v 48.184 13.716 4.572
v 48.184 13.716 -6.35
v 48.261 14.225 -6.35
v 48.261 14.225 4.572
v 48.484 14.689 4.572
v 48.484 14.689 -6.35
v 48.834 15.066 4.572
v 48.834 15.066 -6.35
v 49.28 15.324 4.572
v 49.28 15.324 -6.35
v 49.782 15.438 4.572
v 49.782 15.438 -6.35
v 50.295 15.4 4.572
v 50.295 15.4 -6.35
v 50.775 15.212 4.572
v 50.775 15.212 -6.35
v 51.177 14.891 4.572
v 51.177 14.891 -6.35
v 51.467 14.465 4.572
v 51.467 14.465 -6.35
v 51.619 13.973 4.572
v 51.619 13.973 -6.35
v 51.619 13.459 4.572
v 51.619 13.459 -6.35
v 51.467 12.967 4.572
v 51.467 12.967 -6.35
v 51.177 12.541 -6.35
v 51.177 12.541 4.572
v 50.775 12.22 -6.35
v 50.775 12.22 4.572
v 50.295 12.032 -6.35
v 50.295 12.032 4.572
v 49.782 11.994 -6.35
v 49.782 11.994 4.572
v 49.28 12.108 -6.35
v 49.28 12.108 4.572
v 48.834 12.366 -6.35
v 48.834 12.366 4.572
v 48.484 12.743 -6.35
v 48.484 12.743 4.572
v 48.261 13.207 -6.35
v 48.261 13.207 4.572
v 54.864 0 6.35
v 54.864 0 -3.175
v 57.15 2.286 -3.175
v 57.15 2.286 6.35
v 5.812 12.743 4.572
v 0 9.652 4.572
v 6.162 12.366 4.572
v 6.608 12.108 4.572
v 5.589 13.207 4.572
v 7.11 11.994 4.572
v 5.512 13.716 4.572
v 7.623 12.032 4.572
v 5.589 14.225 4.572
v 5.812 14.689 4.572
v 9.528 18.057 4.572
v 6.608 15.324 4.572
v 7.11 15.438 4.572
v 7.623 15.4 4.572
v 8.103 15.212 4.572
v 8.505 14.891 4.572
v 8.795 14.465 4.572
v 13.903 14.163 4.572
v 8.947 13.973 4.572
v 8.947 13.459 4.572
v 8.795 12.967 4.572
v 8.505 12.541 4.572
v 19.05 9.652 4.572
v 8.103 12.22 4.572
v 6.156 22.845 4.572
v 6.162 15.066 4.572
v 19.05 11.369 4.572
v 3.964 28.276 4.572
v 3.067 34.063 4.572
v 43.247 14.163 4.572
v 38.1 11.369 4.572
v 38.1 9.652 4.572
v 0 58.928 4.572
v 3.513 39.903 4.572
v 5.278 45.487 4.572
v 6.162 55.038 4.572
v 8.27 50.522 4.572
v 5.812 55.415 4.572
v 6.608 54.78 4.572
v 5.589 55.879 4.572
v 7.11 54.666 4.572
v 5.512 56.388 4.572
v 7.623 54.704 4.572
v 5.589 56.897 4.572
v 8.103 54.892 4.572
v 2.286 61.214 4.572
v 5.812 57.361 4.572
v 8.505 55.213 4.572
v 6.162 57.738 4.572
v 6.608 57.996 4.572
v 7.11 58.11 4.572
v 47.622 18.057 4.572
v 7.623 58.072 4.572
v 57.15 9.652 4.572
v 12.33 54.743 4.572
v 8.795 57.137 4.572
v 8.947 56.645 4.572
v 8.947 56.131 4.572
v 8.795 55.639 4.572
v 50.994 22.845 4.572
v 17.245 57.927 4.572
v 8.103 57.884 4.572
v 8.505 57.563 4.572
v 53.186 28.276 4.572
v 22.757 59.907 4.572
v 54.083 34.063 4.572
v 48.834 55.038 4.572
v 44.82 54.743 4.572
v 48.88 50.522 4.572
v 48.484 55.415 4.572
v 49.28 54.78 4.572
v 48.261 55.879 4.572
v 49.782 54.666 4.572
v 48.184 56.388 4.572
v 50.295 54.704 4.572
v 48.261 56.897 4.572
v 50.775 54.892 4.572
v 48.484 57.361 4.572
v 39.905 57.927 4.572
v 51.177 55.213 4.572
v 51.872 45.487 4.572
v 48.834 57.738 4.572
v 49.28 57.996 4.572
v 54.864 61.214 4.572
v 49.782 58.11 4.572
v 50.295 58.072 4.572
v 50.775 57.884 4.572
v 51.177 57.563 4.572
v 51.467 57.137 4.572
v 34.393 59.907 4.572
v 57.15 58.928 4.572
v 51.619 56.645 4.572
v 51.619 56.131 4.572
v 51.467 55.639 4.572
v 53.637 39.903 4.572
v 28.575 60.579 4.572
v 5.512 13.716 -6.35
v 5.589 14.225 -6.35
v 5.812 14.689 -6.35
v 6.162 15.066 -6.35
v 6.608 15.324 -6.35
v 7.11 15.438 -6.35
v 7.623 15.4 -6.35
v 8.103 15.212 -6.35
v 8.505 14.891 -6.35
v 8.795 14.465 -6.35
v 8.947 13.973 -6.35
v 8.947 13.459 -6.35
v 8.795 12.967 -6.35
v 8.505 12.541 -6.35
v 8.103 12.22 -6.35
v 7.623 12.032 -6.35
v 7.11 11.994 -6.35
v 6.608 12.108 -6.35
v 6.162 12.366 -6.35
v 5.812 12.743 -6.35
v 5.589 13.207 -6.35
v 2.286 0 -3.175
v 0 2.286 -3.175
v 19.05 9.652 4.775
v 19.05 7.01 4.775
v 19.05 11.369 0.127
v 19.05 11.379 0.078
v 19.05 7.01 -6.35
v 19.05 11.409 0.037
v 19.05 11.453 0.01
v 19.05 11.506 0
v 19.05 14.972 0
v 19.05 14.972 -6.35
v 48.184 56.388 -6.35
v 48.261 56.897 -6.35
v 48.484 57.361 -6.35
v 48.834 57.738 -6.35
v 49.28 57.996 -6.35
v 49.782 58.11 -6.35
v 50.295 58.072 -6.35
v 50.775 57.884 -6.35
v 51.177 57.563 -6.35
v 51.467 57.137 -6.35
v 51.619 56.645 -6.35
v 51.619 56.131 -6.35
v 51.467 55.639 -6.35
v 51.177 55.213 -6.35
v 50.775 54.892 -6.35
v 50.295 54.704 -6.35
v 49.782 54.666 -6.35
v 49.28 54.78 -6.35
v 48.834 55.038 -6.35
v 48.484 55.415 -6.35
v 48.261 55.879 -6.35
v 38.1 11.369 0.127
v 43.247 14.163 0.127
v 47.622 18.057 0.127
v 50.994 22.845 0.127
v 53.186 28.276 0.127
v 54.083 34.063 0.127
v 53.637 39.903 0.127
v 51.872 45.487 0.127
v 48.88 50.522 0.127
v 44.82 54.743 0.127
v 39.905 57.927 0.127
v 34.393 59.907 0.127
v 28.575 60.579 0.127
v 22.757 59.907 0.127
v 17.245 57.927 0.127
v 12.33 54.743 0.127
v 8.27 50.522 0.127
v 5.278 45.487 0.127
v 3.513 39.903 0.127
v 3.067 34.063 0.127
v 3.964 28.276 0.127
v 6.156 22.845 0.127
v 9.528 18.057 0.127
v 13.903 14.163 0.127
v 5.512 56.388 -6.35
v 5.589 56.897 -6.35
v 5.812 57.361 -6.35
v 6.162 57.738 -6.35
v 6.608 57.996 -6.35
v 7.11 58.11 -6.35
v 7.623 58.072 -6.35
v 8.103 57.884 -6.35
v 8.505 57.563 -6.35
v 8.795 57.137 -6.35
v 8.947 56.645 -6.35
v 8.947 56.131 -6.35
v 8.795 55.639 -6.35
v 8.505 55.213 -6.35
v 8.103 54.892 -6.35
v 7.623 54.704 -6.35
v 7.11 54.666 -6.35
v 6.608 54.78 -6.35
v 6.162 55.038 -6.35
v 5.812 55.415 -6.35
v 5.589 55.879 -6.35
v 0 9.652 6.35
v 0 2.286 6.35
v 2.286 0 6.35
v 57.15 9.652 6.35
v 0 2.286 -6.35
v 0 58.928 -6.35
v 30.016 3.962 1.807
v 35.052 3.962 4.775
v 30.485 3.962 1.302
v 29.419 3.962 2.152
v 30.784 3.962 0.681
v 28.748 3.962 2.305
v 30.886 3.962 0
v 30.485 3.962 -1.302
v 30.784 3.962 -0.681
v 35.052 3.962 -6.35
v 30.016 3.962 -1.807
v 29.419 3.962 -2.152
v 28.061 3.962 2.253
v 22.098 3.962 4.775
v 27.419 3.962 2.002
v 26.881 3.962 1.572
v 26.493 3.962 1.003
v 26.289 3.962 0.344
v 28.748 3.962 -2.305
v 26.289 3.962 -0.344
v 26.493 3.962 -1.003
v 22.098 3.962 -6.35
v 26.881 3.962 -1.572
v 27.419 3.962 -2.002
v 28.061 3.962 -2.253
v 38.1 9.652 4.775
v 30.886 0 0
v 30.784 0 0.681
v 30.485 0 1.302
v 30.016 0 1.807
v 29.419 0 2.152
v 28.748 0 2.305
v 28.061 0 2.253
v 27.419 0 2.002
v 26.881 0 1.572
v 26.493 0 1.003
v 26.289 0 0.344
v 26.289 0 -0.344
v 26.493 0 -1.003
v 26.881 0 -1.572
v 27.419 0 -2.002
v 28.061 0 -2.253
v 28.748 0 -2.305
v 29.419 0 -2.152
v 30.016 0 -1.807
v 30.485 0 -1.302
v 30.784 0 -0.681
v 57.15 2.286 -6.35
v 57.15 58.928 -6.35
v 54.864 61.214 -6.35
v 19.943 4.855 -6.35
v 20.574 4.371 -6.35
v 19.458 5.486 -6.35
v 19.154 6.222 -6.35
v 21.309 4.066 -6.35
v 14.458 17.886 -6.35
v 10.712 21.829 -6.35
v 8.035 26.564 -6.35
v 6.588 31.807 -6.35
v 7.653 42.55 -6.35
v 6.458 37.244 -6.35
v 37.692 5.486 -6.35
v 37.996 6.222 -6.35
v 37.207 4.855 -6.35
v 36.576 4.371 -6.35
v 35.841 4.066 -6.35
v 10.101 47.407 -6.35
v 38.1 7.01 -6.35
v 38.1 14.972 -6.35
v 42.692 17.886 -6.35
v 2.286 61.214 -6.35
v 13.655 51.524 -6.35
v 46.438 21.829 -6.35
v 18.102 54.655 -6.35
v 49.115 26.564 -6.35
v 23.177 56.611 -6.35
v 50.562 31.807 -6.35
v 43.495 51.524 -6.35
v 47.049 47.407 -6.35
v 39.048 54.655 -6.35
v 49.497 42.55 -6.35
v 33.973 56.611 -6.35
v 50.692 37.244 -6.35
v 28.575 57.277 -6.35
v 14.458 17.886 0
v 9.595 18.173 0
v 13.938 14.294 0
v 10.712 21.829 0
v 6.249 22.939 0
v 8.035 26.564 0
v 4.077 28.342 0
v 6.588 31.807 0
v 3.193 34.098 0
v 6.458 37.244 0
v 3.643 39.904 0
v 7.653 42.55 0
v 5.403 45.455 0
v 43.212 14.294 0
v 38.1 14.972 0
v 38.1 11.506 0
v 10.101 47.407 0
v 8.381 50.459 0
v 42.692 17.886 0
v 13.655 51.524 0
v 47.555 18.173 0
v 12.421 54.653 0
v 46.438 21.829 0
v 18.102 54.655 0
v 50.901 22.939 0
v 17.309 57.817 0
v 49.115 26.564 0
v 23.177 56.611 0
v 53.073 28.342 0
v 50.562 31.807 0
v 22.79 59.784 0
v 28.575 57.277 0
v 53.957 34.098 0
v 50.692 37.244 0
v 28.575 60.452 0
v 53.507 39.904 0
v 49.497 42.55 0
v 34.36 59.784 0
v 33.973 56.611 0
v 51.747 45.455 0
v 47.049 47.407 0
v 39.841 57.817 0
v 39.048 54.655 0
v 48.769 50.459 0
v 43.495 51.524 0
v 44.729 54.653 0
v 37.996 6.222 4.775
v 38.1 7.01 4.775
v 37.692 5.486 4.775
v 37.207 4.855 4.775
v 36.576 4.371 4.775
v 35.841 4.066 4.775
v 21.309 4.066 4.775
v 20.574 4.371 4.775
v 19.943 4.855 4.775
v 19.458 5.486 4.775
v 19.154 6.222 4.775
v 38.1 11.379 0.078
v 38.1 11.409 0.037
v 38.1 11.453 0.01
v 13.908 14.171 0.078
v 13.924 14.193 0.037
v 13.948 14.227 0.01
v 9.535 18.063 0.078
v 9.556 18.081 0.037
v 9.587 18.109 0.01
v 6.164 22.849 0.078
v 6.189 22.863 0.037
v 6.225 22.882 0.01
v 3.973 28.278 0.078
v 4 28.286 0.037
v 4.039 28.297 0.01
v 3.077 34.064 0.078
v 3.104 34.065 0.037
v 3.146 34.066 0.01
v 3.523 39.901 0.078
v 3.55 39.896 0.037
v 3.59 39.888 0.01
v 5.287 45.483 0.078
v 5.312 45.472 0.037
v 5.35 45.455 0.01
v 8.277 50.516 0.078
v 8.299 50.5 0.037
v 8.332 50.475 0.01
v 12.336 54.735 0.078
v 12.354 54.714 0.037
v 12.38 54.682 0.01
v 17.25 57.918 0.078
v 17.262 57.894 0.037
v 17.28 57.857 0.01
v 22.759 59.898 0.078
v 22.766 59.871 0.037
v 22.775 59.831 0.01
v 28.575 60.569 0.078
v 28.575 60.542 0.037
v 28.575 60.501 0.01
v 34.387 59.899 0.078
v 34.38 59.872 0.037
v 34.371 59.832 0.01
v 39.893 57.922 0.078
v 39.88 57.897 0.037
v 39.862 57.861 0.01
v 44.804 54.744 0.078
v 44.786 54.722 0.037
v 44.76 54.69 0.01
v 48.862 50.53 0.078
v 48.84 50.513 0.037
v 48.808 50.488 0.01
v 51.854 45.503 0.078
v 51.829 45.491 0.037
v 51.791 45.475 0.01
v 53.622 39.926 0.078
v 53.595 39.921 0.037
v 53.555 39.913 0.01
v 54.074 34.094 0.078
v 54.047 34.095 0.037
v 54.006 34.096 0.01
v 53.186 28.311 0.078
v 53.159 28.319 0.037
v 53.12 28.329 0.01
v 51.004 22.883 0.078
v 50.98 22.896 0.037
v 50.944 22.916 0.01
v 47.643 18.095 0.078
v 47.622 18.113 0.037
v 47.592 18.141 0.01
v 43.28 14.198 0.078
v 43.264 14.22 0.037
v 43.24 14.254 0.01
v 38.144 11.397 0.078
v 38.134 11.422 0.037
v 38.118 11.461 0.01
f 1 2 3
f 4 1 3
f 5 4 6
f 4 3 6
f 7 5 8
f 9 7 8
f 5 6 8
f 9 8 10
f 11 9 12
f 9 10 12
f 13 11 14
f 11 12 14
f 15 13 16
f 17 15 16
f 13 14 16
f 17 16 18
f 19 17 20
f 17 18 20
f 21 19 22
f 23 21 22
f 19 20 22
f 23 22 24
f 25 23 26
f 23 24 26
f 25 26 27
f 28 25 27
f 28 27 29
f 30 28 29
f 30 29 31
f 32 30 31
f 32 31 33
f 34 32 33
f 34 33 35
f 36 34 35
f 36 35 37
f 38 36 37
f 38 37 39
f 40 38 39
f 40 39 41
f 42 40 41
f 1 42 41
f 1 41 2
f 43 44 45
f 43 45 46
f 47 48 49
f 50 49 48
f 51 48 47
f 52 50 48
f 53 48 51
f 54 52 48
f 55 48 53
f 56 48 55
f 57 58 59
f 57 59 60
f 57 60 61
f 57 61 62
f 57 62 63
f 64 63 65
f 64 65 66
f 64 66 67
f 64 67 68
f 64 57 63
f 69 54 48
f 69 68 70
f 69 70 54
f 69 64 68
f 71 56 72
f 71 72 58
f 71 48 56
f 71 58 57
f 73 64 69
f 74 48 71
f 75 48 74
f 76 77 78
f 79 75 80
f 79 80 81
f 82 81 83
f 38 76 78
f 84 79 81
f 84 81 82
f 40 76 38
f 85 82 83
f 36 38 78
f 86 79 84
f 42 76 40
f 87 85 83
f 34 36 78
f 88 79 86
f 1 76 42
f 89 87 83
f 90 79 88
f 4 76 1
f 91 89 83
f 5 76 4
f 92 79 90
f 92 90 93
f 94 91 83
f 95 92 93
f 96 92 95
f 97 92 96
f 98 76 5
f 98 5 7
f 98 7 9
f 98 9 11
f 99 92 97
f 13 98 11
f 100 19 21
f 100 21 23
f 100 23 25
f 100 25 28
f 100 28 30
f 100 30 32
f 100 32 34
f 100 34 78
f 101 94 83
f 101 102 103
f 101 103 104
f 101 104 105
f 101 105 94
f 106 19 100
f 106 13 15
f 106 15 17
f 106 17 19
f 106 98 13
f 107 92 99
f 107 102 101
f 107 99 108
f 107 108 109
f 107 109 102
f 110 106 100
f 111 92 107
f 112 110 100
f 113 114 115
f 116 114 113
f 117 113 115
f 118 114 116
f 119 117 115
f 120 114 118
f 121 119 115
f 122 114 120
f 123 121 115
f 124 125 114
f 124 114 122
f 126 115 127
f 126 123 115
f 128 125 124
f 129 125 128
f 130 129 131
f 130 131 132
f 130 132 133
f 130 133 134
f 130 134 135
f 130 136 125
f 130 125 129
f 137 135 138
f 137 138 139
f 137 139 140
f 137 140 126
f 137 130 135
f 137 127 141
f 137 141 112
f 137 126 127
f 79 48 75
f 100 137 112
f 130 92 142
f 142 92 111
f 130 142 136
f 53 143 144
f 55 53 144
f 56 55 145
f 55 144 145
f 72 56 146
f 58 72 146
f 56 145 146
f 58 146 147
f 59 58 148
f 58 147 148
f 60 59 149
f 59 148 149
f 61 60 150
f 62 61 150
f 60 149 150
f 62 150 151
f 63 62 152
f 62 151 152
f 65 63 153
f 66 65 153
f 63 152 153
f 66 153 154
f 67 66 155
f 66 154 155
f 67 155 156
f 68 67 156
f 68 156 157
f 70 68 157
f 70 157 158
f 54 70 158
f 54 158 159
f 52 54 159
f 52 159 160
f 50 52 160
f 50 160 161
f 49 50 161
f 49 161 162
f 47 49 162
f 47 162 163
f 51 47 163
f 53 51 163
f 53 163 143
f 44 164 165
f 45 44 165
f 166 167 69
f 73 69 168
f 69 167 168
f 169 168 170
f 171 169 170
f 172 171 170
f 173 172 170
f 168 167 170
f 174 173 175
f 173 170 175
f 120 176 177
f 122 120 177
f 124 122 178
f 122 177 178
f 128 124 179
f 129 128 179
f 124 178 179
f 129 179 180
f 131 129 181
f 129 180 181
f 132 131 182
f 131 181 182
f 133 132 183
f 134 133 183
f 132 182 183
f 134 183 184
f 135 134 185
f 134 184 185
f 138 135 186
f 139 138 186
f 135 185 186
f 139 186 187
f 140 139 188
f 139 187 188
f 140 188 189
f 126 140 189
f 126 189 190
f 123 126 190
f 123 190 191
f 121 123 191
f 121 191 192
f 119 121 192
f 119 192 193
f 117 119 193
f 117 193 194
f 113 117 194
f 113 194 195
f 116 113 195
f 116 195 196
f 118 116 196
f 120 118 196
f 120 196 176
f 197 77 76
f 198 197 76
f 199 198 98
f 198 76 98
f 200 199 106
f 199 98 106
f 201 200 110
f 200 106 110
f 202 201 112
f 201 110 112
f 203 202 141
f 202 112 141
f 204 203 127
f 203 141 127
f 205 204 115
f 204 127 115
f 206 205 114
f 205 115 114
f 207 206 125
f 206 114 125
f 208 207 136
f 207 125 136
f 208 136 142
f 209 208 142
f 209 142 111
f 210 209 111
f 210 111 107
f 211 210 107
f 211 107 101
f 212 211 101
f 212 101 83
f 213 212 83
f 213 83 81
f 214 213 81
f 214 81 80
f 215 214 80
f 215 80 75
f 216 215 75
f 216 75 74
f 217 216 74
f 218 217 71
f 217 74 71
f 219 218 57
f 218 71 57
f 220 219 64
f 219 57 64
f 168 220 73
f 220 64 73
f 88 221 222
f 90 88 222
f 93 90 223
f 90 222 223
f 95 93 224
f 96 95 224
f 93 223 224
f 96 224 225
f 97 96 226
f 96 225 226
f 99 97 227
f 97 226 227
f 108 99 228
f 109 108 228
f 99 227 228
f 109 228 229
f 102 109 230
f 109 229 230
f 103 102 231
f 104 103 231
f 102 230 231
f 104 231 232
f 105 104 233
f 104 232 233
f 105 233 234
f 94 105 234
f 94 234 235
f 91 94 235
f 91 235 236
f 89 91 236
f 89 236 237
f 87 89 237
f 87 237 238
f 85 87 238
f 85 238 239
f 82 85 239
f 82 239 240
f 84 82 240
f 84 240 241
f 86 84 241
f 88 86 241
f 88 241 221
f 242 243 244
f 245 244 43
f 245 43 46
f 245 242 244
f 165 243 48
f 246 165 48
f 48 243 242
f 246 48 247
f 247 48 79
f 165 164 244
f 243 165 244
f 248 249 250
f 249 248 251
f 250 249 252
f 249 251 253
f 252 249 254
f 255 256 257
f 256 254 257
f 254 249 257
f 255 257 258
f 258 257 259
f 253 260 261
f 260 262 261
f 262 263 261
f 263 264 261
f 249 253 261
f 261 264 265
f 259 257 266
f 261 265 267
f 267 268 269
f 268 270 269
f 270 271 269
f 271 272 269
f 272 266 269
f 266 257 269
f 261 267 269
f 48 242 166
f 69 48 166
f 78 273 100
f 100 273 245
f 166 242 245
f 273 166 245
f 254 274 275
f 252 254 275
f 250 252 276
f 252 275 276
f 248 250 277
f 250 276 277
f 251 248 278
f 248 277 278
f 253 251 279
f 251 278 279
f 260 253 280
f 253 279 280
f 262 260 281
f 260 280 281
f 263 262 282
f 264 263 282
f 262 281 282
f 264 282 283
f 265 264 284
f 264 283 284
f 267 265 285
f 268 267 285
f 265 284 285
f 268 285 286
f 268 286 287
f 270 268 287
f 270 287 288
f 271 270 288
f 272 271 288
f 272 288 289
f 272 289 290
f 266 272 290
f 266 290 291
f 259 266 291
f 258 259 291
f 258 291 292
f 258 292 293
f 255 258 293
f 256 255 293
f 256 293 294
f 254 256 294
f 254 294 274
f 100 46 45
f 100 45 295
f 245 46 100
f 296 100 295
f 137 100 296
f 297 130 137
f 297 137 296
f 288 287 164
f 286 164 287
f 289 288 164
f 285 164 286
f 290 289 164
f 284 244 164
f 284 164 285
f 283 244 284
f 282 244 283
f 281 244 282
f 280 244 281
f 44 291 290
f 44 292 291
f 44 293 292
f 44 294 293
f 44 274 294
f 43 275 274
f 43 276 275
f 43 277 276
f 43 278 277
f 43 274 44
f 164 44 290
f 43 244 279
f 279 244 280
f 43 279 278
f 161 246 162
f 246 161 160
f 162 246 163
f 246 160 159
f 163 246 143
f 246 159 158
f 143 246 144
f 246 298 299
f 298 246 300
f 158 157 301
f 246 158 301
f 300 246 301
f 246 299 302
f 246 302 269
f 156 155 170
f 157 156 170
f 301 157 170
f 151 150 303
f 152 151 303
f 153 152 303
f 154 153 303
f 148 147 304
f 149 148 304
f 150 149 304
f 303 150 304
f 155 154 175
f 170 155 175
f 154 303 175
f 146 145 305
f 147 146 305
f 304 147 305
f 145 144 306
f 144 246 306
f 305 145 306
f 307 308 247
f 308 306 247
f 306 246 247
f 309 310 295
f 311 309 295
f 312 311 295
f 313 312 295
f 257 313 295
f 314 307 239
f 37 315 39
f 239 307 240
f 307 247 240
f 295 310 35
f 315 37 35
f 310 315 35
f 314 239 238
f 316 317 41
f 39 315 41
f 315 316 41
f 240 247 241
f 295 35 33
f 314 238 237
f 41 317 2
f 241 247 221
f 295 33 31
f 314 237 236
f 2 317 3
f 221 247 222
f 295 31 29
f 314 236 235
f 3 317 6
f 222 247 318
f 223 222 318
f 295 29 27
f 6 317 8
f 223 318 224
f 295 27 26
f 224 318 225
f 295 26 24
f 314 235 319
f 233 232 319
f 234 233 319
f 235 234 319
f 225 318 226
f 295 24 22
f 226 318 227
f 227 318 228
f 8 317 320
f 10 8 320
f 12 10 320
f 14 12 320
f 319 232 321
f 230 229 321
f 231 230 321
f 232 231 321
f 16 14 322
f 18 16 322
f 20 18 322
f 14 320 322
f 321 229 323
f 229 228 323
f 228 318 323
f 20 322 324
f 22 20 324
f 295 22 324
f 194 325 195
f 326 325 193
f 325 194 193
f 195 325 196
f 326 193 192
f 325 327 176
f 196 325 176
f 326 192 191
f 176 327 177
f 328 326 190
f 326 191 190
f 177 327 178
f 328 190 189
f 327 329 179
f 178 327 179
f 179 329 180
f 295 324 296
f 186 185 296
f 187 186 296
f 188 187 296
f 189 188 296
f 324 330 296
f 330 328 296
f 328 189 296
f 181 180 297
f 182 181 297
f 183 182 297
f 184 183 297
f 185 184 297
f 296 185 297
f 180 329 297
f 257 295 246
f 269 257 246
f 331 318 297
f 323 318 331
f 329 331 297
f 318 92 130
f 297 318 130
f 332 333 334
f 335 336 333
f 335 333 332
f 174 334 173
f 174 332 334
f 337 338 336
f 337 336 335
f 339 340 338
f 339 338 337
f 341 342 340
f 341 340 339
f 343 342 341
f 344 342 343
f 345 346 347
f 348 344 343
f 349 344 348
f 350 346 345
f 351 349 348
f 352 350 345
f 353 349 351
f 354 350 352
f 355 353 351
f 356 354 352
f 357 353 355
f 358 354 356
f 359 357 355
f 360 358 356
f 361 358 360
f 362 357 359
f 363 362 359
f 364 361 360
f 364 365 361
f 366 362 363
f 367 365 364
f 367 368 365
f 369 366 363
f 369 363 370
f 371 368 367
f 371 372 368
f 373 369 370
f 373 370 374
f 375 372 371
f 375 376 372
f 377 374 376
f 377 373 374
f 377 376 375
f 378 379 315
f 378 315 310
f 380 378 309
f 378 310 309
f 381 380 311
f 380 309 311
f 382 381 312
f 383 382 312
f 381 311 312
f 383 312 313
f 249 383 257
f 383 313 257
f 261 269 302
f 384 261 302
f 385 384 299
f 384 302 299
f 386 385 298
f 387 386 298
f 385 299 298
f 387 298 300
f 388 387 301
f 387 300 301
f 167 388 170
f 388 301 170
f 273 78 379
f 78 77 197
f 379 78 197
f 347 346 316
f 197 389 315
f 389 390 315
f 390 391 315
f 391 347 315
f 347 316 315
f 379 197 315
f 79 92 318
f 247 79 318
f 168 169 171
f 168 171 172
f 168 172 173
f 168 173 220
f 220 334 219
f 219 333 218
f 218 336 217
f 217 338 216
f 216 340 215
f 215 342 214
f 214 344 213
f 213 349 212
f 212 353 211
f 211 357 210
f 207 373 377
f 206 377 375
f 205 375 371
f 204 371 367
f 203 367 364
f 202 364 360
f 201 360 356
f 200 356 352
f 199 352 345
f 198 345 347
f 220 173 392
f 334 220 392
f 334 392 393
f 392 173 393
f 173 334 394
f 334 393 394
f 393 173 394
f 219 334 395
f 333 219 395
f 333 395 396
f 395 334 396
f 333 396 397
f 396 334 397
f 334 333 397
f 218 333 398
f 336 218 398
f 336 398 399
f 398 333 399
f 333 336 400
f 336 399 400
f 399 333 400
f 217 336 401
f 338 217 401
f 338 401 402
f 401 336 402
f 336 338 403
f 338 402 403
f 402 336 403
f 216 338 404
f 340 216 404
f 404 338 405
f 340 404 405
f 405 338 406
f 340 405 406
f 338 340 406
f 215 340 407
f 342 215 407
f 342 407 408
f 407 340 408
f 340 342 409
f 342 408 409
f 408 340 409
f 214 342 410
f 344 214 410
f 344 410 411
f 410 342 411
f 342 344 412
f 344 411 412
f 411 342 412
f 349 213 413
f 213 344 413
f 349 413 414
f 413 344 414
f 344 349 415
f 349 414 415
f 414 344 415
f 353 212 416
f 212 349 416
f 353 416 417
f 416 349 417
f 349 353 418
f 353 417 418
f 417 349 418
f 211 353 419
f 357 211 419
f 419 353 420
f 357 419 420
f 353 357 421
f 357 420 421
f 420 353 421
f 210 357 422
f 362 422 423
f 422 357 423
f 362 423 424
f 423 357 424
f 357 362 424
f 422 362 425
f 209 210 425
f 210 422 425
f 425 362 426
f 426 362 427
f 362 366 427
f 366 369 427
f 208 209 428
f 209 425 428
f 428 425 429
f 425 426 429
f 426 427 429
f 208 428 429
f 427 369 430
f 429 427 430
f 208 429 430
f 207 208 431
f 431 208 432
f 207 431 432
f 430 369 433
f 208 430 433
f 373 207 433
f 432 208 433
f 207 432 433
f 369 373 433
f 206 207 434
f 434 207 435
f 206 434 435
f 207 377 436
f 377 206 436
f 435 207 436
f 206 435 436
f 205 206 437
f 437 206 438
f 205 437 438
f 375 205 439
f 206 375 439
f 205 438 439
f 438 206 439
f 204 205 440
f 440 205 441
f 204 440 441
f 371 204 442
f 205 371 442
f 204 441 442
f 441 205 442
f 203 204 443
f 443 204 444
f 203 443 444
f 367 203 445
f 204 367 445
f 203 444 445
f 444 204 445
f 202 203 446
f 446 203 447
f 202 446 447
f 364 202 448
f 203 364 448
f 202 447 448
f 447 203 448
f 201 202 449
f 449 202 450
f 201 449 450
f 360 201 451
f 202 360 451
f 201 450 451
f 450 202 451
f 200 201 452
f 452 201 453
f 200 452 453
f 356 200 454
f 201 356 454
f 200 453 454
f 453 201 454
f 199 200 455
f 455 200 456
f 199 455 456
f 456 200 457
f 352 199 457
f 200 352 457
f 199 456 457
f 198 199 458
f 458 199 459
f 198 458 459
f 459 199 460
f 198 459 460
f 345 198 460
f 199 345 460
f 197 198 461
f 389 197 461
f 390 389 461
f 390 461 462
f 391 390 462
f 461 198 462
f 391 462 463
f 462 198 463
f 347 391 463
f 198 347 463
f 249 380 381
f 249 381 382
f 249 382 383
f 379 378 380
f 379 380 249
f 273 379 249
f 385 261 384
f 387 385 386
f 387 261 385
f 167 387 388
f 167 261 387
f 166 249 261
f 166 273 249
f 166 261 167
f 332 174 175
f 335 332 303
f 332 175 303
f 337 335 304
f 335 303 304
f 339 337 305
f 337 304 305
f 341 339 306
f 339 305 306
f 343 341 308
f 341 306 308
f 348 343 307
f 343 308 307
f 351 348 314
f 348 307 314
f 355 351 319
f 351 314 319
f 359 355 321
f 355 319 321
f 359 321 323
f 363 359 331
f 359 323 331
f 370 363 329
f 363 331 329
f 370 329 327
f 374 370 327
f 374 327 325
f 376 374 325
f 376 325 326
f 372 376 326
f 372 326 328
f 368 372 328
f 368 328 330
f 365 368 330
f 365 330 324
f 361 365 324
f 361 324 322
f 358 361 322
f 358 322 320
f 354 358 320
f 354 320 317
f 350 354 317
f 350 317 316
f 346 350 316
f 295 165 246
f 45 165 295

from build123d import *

# Parameters (mm, degrees)
SKETCH1_W                       = 57.15
SKETCH1_H                       = 61.214
BOSS_EXTRUDE1_DEPTH             = 6.35
SKETCH2_W                       = 57.15
SKETCH2_H                       = 51.562
CUT_EXTRUDE1_DEPTH              = 1.778
F_1_1_DIAMETER_HOLE1_D          = 44.45
CUT_EXTRUDE2_DEPTH              = 11.1252
F_14_0_182_DIAMETER_HOLE1_D     = 4.6228
F_14_0_182_DIAMETER_HOLE1_DEPTH = 13.97
F_14_0_182_DIAMETER_HOLE1_TIP   = 1.388829235
SKETCH10_R                      = 25.527
CUT_EXTRUDE3_DEPTH              = 4.572
CHAMFER1_SIZE                   = 2.286
F_8_32_TAPPED_HOLE1_D           = 3.4544
SKETCH13_W                      = 57.15
SKETCH13_H                      = 3.175
CUT_EXTRUDE4_DEPTH              = 2.286
FILLET1_R                       = 0.127


with BuildPart() as part:
    # Sketch1 → Boss-Extrude1 (new body, symmetric)
    with BuildSketch(Plane.XY):
        with Locations((28.575, 30.607)):
            Rectangle(SKETCH1_W, SKETCH1_H)
    extrude(amount=BOSS_EXTRUDE1_DEPTH, both=True)

    # Sketch2 → Cut-Extrude1 (cut)
    with BuildSketch(Plane.XY.offset(6.35)):
        with Locations((28.575, 35.433)):
            Rectangle(SKETCH2_W, SKETCH2_H)
    extrude(amount=-CUT_EXTRUDE1_DEPTH, mode=Mode.SUBTRACT)

    # 1 (1) Diameter Hole1 (through all)
    with Locations(Plane.XY.offset(4.572)):
        with Locations((28.575, 35.052)):
            Hole(F_1_1_DIAMETER_HOLE1_D / 2)

    # Sketch6 → Cut-Extrude2 (cut)
    with BuildSketch(Plane(origin=(0, 0, -6.35), x_dir=(-1, 0, 0), z_dir=(0, 0, -1))):
        with BuildLine():
            Line((-35.052, 3.9624), (-22.098, 3.9624))
            ThreePointArc((-22.098, 3.9624), (-19.942738531, 4.855138531), (-19.05, 7.0104))
            Line((-19.05, 7.0104), (-19.05, 20.953589203))
            Line((-19.05, 20.953589203), (-38.1, 20.953589203))
            Line((-38.1, 20.953589203), (-38.1, 7.0104))
            ThreePointArc((-38.1, 7.0104), (-37.207261469, 4.855138531), (-35.052, 3.9624))
        make_face()
    extrude(amount=-CUT_EXTRUDE2_DEPTH, mode=Mode.SUBTRACT)

    # #14 (0.182) Diameter Hole1
    with Locations(Plane(origin=(0, 3.9624, 0), x_dir=(-1, 0, 0), z_dir=(0, 1, 0))):
        with Locations((-28.575, 0)):
            Hole(F_14_0_182_DIAMETER_HOLE1_D / 2, depth=F_14_0_182_DIAMETER_HOLE1_DEPTH)
            with Locations((0, 0, -(F_14_0_182_DIAMETER_HOLE1_DEPTH + F_14_0_182_DIAMETER_HOLE1_TIP / 2))):  # 118° drill point
                Cone(0, F_14_0_182_DIAMETER_HOLE1_D / 2, F_14_0_182_DIAMETER_HOLE1_TIP, mode=Mode.SUBTRACT)

    # Sketch10 → Cut-Extrude3 (cut)
    with BuildSketch(Plane.XY.offset(4.572)):
        with Locations((28.575, 35.052)):
            Circle(SKETCH10_R)
    extrude(amount=-CUT_EXTRUDE3_DEPTH, mode=Mode.SUBTRACT)

    # Chamfer1
    chamfer1_edges = [part.edges().sort_by_distance(p)[0] for p in [
        (0, 61.214, -0.889),
        (57.15, 61.214, -0.889),
        (57.15, 0, 0),
        (0, 0, 0),
    ]]
    chamfer(chamfer1_edges, length=CHAMFER1_SIZE)

    # #8-32 Tapped Hole1 (through all)
    with Locations(Plane.XY.offset(4.572)):
        with Locations((7.239, 56.388), (49.911, 56.388), (7.239, 13.716), (49.911, 13.716)):
            Hole(F_8_32_TAPPED_HOLE1_D / 2)

    # Sketch13 → Cut-Extrude4 (cut)
    with BuildSketch(Plane.XZ):
        with Locations((28.575, -4.7625)):
            Rectangle(SKETCH13_W, SKETCH13_H)
    extrude(amount=-CUT_EXTRUDE4_DEPTH, mode=Mode.SUBTRACT)

    # Fillet1
    fillet1_edges = [part.edges().sort_by_distance(p)[0] for p in [
        (28.575, 60.579, 0),
    ]]
    fillet(fillet1_edges, radius=FILLET1_R)


solid = part.part
